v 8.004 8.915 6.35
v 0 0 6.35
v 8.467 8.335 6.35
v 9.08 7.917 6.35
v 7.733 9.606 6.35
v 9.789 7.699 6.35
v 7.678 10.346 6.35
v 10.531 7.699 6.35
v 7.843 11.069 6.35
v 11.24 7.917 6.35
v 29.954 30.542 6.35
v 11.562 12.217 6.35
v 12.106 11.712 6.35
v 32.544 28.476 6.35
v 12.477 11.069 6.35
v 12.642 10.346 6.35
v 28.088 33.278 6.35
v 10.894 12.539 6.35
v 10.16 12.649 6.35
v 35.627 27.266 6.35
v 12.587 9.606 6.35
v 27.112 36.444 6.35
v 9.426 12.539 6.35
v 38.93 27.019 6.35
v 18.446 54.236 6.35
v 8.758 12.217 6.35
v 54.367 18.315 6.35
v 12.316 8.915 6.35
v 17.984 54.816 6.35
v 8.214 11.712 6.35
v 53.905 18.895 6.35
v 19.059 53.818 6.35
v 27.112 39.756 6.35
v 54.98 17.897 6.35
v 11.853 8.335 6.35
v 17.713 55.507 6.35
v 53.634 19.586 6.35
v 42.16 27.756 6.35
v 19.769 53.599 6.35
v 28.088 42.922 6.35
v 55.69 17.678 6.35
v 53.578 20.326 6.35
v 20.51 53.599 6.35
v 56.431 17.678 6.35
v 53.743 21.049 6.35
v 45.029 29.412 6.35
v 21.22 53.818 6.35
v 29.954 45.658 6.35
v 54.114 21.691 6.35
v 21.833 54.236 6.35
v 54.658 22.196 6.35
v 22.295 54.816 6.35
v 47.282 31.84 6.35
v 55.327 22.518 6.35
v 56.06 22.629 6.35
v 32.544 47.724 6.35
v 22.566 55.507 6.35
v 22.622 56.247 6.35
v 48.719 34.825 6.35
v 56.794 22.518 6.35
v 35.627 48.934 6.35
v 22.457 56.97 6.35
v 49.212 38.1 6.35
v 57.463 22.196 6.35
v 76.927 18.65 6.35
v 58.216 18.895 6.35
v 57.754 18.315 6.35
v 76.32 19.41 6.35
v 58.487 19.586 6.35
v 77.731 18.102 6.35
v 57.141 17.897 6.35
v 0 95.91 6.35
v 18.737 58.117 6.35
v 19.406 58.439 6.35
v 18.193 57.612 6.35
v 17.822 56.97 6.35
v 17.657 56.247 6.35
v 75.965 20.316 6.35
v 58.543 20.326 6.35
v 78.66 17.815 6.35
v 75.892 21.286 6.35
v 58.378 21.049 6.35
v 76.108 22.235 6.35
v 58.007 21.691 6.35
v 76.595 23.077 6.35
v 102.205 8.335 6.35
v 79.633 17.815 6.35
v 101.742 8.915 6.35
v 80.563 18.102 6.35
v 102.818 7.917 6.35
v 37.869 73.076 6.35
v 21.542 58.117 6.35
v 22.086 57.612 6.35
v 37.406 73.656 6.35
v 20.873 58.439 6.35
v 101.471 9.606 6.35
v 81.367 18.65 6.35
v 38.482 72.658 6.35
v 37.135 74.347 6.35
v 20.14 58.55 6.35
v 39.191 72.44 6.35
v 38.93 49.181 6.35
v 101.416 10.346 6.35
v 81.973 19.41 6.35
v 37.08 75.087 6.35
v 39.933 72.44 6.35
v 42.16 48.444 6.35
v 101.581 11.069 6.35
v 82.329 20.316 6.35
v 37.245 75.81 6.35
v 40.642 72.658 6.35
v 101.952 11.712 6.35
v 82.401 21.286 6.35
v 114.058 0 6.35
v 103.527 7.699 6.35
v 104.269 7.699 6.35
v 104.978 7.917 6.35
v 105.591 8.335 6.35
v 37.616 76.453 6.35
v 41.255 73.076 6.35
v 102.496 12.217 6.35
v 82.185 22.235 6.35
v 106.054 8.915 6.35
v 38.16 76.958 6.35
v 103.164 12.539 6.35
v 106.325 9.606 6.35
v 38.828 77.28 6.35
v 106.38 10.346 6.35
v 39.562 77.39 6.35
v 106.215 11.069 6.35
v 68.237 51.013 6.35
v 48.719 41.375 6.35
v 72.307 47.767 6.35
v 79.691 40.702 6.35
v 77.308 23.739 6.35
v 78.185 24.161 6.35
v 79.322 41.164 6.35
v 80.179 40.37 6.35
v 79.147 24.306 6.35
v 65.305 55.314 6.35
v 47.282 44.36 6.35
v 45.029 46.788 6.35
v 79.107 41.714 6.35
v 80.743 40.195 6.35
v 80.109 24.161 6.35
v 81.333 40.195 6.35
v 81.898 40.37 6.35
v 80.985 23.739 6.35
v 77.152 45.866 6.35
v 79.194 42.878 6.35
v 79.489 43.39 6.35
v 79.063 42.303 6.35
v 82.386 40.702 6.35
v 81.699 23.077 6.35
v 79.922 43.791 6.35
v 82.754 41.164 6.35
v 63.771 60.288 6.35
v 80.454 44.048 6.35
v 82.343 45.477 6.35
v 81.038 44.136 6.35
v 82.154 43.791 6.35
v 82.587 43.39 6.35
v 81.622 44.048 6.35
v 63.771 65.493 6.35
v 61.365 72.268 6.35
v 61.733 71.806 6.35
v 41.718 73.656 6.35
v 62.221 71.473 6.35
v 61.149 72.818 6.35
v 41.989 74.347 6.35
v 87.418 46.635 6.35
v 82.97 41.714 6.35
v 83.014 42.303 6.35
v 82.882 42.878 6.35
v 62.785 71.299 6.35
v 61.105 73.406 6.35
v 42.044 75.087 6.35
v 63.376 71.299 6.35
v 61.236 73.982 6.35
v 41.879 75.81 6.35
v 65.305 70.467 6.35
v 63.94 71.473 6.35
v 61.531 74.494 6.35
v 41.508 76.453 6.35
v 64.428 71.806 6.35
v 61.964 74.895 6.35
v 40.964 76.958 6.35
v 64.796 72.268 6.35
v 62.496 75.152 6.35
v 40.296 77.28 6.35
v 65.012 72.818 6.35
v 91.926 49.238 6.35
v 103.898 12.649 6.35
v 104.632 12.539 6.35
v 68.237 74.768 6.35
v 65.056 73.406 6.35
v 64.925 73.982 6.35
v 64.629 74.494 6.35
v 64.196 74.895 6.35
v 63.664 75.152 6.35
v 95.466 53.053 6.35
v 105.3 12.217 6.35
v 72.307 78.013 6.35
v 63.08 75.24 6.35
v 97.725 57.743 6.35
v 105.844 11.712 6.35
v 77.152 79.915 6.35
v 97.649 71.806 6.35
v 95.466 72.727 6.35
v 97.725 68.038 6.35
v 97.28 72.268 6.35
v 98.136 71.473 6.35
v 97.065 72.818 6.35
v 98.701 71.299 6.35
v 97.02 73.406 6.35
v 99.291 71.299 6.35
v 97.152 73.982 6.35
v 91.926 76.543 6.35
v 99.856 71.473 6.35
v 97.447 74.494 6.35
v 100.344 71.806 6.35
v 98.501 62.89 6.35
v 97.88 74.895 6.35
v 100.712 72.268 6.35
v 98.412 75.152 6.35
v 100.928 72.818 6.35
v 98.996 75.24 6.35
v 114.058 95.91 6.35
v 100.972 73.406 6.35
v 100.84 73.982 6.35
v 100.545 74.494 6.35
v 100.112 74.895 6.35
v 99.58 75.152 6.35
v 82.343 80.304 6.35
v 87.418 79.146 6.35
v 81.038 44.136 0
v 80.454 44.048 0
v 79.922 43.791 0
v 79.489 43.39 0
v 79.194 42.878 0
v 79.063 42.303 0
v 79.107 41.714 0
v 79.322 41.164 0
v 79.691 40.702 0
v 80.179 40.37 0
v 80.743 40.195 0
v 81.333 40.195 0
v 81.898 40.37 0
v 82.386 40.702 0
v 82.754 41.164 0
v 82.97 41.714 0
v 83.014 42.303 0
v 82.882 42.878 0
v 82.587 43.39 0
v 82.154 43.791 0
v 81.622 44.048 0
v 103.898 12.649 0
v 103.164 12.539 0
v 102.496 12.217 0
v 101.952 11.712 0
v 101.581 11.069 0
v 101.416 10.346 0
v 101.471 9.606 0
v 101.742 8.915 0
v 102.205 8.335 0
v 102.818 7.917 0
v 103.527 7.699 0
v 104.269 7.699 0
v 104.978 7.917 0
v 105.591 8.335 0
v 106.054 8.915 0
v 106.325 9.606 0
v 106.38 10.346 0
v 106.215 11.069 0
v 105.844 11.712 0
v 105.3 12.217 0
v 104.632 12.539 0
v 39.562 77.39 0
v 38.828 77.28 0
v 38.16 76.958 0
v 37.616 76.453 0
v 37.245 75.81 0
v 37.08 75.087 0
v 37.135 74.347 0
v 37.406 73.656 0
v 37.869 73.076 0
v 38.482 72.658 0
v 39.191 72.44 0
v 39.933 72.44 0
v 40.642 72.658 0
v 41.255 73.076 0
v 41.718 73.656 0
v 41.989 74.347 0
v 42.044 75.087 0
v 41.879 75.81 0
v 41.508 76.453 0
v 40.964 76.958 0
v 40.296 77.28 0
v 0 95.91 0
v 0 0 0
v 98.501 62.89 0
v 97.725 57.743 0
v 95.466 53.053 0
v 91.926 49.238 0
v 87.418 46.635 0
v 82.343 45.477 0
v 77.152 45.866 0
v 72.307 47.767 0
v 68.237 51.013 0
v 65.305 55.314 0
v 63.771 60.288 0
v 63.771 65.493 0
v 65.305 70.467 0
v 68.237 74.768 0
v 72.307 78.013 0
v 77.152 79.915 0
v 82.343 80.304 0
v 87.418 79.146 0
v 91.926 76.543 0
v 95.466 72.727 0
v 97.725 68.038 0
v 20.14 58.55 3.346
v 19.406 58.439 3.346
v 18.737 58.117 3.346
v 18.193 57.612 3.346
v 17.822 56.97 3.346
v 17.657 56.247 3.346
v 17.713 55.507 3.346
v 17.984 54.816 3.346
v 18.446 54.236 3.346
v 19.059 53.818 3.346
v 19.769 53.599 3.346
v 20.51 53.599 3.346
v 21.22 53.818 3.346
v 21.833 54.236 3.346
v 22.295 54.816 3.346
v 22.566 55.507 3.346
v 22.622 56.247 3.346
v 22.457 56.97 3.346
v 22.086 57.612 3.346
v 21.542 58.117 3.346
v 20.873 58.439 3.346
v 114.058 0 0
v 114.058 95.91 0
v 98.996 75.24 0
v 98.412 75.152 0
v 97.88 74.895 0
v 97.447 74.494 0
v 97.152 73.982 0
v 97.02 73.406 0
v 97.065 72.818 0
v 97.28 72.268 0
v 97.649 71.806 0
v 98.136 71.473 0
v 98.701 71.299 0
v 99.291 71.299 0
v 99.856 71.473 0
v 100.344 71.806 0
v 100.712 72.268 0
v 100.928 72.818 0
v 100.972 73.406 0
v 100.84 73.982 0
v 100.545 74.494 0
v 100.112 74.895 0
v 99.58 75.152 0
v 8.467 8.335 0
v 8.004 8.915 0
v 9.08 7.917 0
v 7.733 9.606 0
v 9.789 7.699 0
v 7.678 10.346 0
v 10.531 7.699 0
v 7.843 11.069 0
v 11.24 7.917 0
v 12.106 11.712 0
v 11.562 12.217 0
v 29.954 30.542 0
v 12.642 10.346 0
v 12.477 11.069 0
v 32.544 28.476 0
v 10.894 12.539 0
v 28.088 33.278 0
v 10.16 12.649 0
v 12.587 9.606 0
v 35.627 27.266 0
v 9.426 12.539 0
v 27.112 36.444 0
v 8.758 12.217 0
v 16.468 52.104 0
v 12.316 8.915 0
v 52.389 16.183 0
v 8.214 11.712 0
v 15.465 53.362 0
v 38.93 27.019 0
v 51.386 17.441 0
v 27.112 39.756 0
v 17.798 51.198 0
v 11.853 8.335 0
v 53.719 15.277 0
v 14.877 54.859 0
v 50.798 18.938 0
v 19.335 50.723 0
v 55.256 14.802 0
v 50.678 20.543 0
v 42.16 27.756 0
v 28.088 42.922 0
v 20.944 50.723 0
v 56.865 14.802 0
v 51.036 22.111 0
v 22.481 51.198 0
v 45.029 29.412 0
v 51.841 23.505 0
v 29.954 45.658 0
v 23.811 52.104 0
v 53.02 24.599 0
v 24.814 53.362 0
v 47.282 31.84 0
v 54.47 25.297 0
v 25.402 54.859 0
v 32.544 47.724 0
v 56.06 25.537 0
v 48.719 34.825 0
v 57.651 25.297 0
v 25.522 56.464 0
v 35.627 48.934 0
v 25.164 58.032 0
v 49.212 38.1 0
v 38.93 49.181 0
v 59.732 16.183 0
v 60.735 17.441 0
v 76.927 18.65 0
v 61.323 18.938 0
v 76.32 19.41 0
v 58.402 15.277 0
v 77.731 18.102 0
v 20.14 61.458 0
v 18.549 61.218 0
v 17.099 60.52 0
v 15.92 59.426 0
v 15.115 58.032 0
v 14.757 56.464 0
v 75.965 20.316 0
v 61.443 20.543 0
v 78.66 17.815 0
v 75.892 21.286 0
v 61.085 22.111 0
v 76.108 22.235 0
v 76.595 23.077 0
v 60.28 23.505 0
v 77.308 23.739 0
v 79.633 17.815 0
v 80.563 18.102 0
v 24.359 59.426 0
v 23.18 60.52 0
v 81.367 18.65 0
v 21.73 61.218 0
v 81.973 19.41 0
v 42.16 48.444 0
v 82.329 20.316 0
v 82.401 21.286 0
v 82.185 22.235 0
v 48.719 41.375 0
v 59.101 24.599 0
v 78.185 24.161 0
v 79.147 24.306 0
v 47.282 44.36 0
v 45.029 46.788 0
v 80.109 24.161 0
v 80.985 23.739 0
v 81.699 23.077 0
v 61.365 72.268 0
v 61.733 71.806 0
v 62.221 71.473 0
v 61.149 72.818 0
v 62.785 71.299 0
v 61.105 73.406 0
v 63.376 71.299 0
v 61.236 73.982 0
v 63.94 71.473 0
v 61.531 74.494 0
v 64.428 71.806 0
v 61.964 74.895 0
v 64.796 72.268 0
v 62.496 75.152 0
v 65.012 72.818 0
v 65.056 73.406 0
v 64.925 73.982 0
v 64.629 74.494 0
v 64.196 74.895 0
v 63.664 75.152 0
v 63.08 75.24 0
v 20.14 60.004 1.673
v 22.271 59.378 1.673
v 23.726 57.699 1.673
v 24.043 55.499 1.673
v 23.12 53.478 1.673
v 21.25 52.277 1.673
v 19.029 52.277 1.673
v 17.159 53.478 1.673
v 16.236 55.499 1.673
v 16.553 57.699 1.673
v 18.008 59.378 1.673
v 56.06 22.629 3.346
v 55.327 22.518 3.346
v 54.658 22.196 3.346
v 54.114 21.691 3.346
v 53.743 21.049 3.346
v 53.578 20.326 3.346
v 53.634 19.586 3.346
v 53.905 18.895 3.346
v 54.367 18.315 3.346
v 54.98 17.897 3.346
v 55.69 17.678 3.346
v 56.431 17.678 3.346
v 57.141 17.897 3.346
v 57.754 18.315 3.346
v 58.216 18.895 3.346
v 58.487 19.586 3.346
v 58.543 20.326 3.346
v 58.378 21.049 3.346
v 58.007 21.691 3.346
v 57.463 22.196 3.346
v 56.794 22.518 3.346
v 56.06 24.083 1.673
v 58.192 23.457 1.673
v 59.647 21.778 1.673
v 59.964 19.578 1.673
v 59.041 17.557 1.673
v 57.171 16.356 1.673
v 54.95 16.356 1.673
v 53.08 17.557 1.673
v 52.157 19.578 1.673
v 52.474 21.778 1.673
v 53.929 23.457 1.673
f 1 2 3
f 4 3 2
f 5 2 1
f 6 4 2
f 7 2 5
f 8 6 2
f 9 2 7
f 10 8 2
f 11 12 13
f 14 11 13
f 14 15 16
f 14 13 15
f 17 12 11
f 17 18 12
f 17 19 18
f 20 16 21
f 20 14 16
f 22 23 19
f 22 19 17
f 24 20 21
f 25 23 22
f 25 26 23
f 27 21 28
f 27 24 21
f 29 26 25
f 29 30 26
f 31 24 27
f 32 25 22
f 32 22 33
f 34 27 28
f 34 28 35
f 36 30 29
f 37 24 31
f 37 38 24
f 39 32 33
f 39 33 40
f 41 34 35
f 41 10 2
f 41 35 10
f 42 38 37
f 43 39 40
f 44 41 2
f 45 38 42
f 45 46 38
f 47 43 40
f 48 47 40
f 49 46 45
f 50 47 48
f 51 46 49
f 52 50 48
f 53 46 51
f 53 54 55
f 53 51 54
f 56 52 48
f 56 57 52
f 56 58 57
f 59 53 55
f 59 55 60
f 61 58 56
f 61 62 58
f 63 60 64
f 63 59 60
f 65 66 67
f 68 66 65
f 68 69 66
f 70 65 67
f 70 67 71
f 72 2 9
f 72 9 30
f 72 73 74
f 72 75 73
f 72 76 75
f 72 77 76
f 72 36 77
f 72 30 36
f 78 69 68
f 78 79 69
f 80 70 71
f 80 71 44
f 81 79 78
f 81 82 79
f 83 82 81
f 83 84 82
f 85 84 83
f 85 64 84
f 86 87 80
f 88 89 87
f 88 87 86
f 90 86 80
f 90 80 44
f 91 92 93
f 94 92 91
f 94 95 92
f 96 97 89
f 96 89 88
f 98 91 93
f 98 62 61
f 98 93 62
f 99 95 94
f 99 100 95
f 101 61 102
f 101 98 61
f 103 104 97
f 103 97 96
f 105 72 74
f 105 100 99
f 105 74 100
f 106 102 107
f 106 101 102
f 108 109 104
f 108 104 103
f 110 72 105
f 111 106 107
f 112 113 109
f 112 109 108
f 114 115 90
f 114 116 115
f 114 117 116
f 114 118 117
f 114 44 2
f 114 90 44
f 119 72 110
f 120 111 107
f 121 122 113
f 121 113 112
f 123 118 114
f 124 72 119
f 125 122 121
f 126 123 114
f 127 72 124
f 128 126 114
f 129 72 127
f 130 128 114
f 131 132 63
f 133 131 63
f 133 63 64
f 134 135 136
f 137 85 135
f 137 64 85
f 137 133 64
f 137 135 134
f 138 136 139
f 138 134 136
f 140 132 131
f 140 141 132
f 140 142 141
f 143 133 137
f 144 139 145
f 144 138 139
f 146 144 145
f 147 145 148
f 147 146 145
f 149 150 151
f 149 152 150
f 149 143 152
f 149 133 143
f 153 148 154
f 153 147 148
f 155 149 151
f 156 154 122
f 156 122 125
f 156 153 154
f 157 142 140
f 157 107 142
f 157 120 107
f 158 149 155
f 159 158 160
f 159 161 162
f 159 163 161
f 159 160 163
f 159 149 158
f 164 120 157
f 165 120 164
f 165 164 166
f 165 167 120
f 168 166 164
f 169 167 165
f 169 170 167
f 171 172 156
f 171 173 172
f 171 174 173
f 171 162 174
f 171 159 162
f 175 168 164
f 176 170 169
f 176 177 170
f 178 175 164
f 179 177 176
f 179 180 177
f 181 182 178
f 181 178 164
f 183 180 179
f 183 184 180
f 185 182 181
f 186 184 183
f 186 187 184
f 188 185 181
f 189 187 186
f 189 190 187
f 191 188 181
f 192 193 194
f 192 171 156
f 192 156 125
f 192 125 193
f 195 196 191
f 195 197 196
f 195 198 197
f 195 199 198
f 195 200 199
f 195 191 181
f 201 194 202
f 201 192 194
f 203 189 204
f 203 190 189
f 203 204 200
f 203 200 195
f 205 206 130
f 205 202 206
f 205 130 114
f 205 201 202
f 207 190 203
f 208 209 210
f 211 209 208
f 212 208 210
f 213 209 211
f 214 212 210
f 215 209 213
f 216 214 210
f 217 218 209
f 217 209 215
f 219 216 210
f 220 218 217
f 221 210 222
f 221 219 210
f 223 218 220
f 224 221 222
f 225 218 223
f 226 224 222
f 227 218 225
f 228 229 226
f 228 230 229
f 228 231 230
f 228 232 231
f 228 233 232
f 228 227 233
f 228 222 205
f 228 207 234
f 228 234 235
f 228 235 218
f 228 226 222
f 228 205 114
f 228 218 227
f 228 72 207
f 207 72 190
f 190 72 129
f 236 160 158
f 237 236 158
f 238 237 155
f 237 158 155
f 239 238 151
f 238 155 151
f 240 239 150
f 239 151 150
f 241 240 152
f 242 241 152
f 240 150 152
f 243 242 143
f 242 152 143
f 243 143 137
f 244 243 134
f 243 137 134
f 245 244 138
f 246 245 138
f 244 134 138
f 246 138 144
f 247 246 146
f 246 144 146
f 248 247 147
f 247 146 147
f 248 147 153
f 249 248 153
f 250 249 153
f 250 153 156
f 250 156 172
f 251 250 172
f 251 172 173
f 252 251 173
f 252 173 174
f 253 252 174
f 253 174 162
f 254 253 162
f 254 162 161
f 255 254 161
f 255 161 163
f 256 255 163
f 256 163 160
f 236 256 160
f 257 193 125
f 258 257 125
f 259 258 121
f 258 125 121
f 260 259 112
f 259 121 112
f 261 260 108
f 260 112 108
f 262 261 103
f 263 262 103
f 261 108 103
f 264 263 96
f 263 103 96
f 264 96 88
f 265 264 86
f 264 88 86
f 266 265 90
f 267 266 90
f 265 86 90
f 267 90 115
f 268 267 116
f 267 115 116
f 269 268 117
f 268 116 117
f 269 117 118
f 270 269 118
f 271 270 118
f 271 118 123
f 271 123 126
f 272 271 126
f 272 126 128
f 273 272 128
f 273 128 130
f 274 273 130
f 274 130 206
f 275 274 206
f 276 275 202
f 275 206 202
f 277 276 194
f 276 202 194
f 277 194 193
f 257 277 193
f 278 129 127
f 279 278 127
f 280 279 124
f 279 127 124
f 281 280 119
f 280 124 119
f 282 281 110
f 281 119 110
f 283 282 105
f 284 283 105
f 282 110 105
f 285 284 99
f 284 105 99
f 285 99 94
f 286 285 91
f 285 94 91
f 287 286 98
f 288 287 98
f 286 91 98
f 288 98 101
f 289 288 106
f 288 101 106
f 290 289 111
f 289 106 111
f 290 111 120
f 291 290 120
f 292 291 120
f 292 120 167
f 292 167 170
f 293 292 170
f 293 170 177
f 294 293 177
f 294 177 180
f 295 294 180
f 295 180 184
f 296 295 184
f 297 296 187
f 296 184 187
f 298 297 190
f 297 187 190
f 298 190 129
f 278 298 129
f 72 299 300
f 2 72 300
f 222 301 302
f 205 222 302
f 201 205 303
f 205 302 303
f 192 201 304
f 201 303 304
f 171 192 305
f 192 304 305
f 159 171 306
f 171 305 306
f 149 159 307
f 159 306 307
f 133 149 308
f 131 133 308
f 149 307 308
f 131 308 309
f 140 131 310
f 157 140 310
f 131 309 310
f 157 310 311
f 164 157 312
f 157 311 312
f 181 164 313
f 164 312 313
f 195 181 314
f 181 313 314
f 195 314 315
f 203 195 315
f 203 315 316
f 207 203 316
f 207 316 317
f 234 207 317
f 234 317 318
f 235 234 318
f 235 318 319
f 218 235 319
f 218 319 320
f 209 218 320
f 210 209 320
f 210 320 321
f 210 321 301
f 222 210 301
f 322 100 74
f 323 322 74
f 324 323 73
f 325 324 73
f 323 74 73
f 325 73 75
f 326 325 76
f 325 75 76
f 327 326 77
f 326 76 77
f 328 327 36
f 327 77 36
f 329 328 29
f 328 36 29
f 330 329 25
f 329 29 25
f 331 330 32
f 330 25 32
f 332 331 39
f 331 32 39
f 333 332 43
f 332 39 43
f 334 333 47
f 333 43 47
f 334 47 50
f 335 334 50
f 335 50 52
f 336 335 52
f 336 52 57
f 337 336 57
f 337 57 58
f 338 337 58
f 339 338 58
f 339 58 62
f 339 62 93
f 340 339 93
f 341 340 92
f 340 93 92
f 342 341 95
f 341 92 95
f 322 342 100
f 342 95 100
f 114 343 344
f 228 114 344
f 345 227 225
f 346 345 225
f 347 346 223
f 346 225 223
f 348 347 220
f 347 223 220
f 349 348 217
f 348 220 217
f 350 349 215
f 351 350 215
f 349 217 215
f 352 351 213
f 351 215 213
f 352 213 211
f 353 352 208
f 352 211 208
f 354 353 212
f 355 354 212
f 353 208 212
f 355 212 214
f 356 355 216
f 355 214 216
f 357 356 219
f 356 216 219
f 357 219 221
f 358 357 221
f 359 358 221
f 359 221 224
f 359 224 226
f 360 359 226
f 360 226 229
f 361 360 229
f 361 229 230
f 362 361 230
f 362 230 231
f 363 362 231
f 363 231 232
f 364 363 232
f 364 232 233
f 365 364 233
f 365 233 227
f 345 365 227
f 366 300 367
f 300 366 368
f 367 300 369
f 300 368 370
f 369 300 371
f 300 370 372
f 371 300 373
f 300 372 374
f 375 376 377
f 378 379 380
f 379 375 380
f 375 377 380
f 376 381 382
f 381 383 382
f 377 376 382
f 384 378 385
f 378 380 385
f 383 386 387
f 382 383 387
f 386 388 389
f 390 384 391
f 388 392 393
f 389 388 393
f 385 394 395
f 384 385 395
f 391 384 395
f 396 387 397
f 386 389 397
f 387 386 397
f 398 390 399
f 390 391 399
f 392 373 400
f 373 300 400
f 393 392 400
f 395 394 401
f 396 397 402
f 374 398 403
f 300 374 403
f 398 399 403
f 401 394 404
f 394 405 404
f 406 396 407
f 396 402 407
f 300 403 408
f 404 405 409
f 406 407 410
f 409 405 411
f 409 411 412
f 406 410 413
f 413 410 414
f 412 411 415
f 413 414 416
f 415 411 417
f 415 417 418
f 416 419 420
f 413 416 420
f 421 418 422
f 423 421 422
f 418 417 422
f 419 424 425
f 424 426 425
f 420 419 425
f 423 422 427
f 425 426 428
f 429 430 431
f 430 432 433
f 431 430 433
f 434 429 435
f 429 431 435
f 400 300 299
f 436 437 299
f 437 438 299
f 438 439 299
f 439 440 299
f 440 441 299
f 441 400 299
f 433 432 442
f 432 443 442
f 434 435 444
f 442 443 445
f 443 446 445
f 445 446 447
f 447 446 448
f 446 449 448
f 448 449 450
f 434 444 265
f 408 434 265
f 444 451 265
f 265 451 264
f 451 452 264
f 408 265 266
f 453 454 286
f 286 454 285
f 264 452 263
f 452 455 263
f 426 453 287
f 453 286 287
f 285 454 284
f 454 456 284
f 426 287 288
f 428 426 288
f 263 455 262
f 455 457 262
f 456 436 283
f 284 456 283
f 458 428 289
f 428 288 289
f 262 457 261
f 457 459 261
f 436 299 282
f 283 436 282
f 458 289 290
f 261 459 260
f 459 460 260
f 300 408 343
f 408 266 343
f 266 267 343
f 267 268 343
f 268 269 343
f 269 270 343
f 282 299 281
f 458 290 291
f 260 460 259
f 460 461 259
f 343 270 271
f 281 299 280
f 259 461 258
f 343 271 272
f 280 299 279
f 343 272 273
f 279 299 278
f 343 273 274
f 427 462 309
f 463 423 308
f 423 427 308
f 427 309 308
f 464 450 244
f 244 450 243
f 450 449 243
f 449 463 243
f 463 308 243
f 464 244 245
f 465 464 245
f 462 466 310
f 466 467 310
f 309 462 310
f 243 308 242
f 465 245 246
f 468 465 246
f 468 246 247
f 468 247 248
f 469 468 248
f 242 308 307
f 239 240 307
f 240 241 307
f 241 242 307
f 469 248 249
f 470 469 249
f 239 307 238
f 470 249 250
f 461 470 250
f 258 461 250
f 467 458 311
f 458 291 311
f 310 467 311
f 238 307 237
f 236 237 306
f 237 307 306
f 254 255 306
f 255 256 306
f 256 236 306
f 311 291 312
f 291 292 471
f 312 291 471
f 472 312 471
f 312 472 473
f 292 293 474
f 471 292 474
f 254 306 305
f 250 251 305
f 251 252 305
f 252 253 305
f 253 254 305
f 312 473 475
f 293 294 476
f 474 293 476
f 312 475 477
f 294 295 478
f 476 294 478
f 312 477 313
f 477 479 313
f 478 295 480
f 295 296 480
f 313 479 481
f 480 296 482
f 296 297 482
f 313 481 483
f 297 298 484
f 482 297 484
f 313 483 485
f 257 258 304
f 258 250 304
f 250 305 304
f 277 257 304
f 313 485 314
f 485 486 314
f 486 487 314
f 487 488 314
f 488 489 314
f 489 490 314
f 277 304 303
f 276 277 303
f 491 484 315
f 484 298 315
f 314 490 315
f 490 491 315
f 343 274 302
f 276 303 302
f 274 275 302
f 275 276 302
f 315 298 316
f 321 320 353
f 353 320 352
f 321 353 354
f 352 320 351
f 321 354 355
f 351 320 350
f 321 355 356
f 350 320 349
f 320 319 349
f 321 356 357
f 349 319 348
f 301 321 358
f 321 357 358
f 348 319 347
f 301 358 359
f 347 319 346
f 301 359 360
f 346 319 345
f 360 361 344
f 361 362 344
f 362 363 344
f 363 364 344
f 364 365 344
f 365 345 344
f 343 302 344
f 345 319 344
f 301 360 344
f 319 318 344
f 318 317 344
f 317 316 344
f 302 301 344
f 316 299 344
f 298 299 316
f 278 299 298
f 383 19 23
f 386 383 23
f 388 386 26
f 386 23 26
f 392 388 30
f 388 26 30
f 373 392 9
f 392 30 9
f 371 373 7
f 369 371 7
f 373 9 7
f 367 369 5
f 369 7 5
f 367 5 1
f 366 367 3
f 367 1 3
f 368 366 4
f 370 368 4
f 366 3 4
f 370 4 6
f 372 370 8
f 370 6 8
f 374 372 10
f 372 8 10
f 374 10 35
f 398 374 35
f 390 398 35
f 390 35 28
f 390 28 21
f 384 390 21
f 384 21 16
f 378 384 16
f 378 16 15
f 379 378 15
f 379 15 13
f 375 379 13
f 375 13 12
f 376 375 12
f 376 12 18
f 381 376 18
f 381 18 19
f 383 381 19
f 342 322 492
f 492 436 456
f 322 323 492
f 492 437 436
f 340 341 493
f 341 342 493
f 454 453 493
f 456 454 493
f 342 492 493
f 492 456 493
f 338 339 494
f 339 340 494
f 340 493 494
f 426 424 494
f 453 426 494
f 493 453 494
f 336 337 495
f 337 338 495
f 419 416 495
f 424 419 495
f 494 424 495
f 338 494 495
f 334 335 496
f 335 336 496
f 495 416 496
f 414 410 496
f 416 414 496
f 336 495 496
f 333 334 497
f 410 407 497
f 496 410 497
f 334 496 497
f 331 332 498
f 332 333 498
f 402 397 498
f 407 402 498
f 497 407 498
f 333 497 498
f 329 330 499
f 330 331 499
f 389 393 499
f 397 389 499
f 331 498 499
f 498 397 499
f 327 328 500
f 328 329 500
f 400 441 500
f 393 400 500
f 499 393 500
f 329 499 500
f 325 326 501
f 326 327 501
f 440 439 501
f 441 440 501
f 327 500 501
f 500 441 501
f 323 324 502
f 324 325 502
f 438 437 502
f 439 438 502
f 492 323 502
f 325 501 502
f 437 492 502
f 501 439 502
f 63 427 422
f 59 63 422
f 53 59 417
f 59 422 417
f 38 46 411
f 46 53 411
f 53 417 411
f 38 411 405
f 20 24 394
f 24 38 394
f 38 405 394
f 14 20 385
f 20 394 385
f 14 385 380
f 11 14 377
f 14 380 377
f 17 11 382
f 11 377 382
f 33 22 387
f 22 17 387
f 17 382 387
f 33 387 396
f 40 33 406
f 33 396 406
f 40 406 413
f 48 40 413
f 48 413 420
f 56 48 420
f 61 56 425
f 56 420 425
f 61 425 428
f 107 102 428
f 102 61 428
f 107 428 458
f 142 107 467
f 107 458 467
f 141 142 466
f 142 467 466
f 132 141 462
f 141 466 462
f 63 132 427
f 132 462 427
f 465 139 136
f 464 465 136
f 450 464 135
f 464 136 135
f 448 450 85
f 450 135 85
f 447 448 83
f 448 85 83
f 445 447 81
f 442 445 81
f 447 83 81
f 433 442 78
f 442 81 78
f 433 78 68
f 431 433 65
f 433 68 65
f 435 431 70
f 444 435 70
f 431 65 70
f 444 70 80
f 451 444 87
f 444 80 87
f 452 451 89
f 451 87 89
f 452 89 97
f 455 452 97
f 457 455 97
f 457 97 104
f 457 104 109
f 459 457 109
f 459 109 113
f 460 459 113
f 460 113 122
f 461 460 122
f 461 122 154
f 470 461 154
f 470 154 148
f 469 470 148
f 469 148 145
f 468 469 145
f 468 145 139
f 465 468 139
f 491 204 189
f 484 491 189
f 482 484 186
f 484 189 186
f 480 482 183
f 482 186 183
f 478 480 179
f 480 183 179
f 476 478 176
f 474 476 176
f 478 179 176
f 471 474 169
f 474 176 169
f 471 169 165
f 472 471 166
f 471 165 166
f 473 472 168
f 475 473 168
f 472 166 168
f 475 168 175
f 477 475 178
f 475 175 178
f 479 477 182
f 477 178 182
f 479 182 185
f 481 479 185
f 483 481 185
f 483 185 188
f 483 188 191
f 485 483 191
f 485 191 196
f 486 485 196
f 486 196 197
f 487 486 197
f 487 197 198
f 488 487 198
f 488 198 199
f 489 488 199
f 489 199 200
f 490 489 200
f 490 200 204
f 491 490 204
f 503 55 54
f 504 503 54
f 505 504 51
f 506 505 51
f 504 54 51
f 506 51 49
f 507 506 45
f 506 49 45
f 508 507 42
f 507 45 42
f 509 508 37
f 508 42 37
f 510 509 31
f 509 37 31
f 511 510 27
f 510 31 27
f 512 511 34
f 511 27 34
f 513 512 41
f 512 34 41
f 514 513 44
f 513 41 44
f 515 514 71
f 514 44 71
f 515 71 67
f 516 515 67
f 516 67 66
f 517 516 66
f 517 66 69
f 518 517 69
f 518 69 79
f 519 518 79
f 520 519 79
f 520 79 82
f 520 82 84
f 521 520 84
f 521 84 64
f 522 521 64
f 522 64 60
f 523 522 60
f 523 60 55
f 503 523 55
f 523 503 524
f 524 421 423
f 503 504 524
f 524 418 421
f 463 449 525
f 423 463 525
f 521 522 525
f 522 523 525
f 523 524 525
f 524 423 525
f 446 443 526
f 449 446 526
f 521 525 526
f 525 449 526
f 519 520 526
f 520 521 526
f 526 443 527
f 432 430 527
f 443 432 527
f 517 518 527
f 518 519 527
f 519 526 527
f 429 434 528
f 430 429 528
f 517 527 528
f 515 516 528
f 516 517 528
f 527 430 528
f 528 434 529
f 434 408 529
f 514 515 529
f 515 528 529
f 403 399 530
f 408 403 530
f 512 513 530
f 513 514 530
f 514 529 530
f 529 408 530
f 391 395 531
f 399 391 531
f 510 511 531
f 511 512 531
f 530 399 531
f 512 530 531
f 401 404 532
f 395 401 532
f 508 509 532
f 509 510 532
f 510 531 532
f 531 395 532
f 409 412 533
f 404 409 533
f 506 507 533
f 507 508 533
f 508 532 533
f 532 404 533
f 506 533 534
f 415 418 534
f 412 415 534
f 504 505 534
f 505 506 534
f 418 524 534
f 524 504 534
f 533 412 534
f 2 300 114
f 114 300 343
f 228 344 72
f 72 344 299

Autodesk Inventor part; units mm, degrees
sketch "Sketch1" plane through (0, 0, 0) normal (0, 0, 1) x (1, 0, 0)
  line L0 (0, 0) -> (114.0582, 0)
  line L1 (114.0582, 0) -> (114.0582, 95.9104)
  line L2 (114.0582, 95.9104) -> (0, 95.9104)
  line L3 (0, 95.9104) -> (0, 0)
  line L4 (59.1, 17.1) -> (59.1, 59.1)
  line L5 (59.1, 59.1) -> (17.1, 59.1)
  line L6 (17.1, 59.1) -> (17.1, 17.1)
  line L7 (17.1, 17.1) -> (59.1, 17.1)
  line L8 (59.1, 17.1) -> (17.1, 59.1) construction
  line L9 (59.1, 59.1) -> (17.1, 17.1) construction
  circle A0 centre (38.1, 38.1) radius 38.1 construction
  circle A1 centre (38.1, 38.1) radius 20.2
  line L10 (45.4323, 38.1) -> (41.7662, 31.75)
  line L11 (41.7662, 31.75) -> (34.4338, 31.75)
  line L12 (34.4338, 31.75) -> (30.7677, 38.1)
  line L13 (30.7677, 38.1) -> (34.4338, 44.45)
  line L14 (34.4338, 44.45) -> (41.7662, 44.45)
  line L15 (41.7662, 44.45) -> (45.4323, 38.1)
  circle A2 centre (38.1, 38.1) radius 21.59 construction
  line L16 (38.1, 38.1) -> (81.0382, 62.8904) construction
  circle A3 centre (81.0382, 62.8904) radius 27.94 construction
  circle A4 centre (81.0382, 62.8904) radius 23.8125 construction
  circle A5 centre (81.0382, 62.8904) radius 17.4625
  circle A6 centre (38.1, 38.1) radius 14.2875
  line L17 (85.0105, 18.6054) -> (38.1, 38.1) construction
  circle A7 centre (81.0382, 62.8904) radius 33.02 construction
  circle A8 centre (38.1, 38.1) radius 25.4 construction
  circle A9 centre (38.1, 38.1) radius 11.1125
  line L18 (81.0382, 62.8904) -> (81.0382, 42.1545)
  circle A10 centre (81.0382, 42.1545) radius 2.0828 construction
  circle A11 centre (39.5622, 74.901) radius 10.16
  circle A12 centre (39.5622, 74.901) radius 6.35
  circle A13 centre (81.0382, 42.1545) radius 6.35 construction
  circle A14 centre (38.1, 38.1) radius 26.67 construction
  line L19 (85.0105, 18.6054) -> (87.4474, 24.4692)
  line L20 (85.0105, 18.6054) -> (82.5737, 12.7416)
  line L21 (87.4474, 24.4692) -> (77.6267, 28.5504)
  line L22 (82.5737, 12.7416) -> (72.2567, 17.029)
  circle A15 centre (103.8982, 10.16) radius 10.16
  circle A16 centre (103.8982, 10.16) radius 6.35
  circle A17 centre (10.16, 10.16) radius 10.16
  circle A18 centre (38.1, 38.1) radius 32.258 construction
  circle A19 centre (10.16, 10.16) radius 6.35
  point P0 (20.1395, 56.0605)
  point P1 (56.0605, 20.1395)
  point P2 (81.0382, 44.2373)
  point P3 (81.0382, 45.4279)
  point P4 (98.9961, 73.2584)
  point P5 (63.0804, 73.2584)
  point P6 (81.0382, 48.5045)
  point P7 (79.1467, 21.0422)
  dimension "d10" = 34.925
  dimension "d17" = 4.1656
  dimension "d25" = 12.7
  dimension "d0" = 42
  dimension "d1" = 42
  dimension "d2" = 76.2
  dimension "d3" = 40.4
  dimension "d4" = 12.7
  dimension "d5" = 43.18
  dimension "d6" = 55.88
  dimension "d7" = 49.5808
  dimension "d8" = 47.625
  dimension "d11" = 28.575
  dimension "d13" = 30
  dimension "d14" = 5.08
  dimension "d15" = 50.8
  dimension "d16" = 22.225
  dimension "d18" = 1.1906
  dimension "d21" = 360
  dimension "d23" = 20.32
  dimension "d24" = 12.7
  dimension "d26" = 3.0766
  dimension "d30" = 5.08
  dimension "d33" = 50.8
  dimension "d34" = 6.35
  dimension "d35" = 6.35
  dimension "d36" = 20.32
  dimension "d37" = 64.516
  dimension "d38" = 12.7
ref_plane "Work Plane1" through (0, 0, -6.35) normal (0, 0, 1) x (1, 0, 0)
ref_plane "Work Plane2" through (0, 0, -41.875) normal (0, 0, 1) x (1, 0, 0)
ref_plane "Work Plane3" through (0, 0, -35.525) normal (0, 0, 1) x (1, 0, 0)
ref_plane "Work Plane4" through (0, 0, -92.675) normal (0, 0, 1) x (1, 0, 0)
ref_plane "Work Plane5" through (0, 0, -99.025) normal (0, 0, 1) x (1, 0, 0)
sketch "Sketch2" plane through (0, 0, -6.35) normal (0, 0, 1) x (1, 0, 0)
  line L0 (114.0582, 95.9104) -> (0, 95.9104) projected
  line L1 (0, 95.9104) -> (0, 0) projected
  line L2 (0, 0) -> (114.0582, 0) projected
  line L3 (114.0582, 0) -> (114.0582, 95.9104) projected
  circle A0 centre (81.0382, 62.8904) radius 17.4625 projected
  circle A1 centre (38.1, 38.1) radius 11.1125 projected
sketch "Sketch3" plane through (0, 0, -41.875) normal (0, 0, 1) x (1, 0, 0)
  line L0 (114.0582, 95.9104) -> (0, 95.9104) projected
  line L1 (114.0582, 0) -> (114.0582, 95.9104) projected
  circle A0 centre (81.0382, 62.8904) radius 17.4625 projected
  line L2 (0, 0) -> (114.0582, 0) projected
  line L3 (0, 95.9104) -> (0, 0) projected
  circle A1 centre (38.1, 38.1) radius 14.2875 projected
sketch "Sketch4" plane through (0, 0, -35.525) normal (0, 0, 1) x (1, 0, 0)
  line L0 (114.0582, 95.9104) -> (0, 95.9104) projected
  line L1 (0, 95.9104) -> (0, 0) projected
  line L2 (0, 0) -> (114.0582, 0) projected
  line L3 (114.0582, 0) -> (114.0582, 95.9104) projected
  circle A0 centre (81.0382, 62.8904) radius 17.4625 projected
  circle A1 centre (38.1, 38.1) radius 14.2875 projected
sketch "Sketch5" plane through (0, 0, -92.675) normal (0, 0, 1) x (1, 0, 0)
  line L0 (0, 95.9104) -> (0, 0) projected
  line L1 (114.0582, 95.9104) -> (0, 95.9104) projected
  line L2 (0, 0) -> (114.0582, 0) projected
  line L3 (114.0582, 0) -> (114.0582, 95.9104) projected
  circle A0 centre (81.0382, 62.8904) radius 17.4625 projected
sketch "Sketch6" plane through (0, 0, -99.025) normal (0, 0, 1) x (1, 0, 0)
  line L0 (0, 95.9104) -> (0, 0) projected
  line L1 (0, 0) -> (114.0582, 0) projected
  line L2 (114.0582, 0) -> (114.0582, 95.9104) projected
  line L3 (114.0582, 95.9104) -> (0, 95.9104) projected
  circle A0 centre (81.0382, 62.8904) radius 17.4625 projected
extrude "Extrusion1" add sketch "Sketch1" along normal blind 6.35 contours L3 A17 L0 | A17 L7 L4 L5 L6 L3 L2 L1 A15 L0 | A17 L6 L7 | A15 L1 L0 | A15 | A17 L7 L6 | L6 L5 L4 L7 A17 | A1 | A6 | A11 | A12 | A16 | A19
hole "Hole1" at (39.5622, 74.901, 0) at (10.16, 10.16, 0) at (103.8982, 10.16, 0) direction (0, 0, 1) diameter 4.9784 end through all clearance for "Flat Head Machine Screw (82)" size "#10" standard "Ansi Unified Screw Threads"
hole "Hole2" at (81.0382, 42.1545, 0) at (98.9961, 73.2584, 0) at (63.0804, 73.2584, 0) direction (0, 0, 1) diameter 3.9624 end through all thread size "10-32 UNF" class "2B" standard "ANSI Unified Screw Threads"
hole "Hole3" at (79.1467, 21.0422, 0) direction (0, 0, 1) diameter 6.5278 end through all clearance for "Flat Head Machine Screw (82)" size "1/4" standard "Ansi Unified Screw Threads"
hole "Hole4" at (20.1395, 56.0605, 0) at (56.0605, 20.1395, 0) direction (0, 0, 1) diameter 4.9784 end through all countersink diameter 10.795 countersink angle 82 clearance for "Flat Head Machine Screw (82)" size "#10" standard "Ansi Unified Screw Threads"
equation "\"d30\" = d14"
properties part number "Main Outline"
